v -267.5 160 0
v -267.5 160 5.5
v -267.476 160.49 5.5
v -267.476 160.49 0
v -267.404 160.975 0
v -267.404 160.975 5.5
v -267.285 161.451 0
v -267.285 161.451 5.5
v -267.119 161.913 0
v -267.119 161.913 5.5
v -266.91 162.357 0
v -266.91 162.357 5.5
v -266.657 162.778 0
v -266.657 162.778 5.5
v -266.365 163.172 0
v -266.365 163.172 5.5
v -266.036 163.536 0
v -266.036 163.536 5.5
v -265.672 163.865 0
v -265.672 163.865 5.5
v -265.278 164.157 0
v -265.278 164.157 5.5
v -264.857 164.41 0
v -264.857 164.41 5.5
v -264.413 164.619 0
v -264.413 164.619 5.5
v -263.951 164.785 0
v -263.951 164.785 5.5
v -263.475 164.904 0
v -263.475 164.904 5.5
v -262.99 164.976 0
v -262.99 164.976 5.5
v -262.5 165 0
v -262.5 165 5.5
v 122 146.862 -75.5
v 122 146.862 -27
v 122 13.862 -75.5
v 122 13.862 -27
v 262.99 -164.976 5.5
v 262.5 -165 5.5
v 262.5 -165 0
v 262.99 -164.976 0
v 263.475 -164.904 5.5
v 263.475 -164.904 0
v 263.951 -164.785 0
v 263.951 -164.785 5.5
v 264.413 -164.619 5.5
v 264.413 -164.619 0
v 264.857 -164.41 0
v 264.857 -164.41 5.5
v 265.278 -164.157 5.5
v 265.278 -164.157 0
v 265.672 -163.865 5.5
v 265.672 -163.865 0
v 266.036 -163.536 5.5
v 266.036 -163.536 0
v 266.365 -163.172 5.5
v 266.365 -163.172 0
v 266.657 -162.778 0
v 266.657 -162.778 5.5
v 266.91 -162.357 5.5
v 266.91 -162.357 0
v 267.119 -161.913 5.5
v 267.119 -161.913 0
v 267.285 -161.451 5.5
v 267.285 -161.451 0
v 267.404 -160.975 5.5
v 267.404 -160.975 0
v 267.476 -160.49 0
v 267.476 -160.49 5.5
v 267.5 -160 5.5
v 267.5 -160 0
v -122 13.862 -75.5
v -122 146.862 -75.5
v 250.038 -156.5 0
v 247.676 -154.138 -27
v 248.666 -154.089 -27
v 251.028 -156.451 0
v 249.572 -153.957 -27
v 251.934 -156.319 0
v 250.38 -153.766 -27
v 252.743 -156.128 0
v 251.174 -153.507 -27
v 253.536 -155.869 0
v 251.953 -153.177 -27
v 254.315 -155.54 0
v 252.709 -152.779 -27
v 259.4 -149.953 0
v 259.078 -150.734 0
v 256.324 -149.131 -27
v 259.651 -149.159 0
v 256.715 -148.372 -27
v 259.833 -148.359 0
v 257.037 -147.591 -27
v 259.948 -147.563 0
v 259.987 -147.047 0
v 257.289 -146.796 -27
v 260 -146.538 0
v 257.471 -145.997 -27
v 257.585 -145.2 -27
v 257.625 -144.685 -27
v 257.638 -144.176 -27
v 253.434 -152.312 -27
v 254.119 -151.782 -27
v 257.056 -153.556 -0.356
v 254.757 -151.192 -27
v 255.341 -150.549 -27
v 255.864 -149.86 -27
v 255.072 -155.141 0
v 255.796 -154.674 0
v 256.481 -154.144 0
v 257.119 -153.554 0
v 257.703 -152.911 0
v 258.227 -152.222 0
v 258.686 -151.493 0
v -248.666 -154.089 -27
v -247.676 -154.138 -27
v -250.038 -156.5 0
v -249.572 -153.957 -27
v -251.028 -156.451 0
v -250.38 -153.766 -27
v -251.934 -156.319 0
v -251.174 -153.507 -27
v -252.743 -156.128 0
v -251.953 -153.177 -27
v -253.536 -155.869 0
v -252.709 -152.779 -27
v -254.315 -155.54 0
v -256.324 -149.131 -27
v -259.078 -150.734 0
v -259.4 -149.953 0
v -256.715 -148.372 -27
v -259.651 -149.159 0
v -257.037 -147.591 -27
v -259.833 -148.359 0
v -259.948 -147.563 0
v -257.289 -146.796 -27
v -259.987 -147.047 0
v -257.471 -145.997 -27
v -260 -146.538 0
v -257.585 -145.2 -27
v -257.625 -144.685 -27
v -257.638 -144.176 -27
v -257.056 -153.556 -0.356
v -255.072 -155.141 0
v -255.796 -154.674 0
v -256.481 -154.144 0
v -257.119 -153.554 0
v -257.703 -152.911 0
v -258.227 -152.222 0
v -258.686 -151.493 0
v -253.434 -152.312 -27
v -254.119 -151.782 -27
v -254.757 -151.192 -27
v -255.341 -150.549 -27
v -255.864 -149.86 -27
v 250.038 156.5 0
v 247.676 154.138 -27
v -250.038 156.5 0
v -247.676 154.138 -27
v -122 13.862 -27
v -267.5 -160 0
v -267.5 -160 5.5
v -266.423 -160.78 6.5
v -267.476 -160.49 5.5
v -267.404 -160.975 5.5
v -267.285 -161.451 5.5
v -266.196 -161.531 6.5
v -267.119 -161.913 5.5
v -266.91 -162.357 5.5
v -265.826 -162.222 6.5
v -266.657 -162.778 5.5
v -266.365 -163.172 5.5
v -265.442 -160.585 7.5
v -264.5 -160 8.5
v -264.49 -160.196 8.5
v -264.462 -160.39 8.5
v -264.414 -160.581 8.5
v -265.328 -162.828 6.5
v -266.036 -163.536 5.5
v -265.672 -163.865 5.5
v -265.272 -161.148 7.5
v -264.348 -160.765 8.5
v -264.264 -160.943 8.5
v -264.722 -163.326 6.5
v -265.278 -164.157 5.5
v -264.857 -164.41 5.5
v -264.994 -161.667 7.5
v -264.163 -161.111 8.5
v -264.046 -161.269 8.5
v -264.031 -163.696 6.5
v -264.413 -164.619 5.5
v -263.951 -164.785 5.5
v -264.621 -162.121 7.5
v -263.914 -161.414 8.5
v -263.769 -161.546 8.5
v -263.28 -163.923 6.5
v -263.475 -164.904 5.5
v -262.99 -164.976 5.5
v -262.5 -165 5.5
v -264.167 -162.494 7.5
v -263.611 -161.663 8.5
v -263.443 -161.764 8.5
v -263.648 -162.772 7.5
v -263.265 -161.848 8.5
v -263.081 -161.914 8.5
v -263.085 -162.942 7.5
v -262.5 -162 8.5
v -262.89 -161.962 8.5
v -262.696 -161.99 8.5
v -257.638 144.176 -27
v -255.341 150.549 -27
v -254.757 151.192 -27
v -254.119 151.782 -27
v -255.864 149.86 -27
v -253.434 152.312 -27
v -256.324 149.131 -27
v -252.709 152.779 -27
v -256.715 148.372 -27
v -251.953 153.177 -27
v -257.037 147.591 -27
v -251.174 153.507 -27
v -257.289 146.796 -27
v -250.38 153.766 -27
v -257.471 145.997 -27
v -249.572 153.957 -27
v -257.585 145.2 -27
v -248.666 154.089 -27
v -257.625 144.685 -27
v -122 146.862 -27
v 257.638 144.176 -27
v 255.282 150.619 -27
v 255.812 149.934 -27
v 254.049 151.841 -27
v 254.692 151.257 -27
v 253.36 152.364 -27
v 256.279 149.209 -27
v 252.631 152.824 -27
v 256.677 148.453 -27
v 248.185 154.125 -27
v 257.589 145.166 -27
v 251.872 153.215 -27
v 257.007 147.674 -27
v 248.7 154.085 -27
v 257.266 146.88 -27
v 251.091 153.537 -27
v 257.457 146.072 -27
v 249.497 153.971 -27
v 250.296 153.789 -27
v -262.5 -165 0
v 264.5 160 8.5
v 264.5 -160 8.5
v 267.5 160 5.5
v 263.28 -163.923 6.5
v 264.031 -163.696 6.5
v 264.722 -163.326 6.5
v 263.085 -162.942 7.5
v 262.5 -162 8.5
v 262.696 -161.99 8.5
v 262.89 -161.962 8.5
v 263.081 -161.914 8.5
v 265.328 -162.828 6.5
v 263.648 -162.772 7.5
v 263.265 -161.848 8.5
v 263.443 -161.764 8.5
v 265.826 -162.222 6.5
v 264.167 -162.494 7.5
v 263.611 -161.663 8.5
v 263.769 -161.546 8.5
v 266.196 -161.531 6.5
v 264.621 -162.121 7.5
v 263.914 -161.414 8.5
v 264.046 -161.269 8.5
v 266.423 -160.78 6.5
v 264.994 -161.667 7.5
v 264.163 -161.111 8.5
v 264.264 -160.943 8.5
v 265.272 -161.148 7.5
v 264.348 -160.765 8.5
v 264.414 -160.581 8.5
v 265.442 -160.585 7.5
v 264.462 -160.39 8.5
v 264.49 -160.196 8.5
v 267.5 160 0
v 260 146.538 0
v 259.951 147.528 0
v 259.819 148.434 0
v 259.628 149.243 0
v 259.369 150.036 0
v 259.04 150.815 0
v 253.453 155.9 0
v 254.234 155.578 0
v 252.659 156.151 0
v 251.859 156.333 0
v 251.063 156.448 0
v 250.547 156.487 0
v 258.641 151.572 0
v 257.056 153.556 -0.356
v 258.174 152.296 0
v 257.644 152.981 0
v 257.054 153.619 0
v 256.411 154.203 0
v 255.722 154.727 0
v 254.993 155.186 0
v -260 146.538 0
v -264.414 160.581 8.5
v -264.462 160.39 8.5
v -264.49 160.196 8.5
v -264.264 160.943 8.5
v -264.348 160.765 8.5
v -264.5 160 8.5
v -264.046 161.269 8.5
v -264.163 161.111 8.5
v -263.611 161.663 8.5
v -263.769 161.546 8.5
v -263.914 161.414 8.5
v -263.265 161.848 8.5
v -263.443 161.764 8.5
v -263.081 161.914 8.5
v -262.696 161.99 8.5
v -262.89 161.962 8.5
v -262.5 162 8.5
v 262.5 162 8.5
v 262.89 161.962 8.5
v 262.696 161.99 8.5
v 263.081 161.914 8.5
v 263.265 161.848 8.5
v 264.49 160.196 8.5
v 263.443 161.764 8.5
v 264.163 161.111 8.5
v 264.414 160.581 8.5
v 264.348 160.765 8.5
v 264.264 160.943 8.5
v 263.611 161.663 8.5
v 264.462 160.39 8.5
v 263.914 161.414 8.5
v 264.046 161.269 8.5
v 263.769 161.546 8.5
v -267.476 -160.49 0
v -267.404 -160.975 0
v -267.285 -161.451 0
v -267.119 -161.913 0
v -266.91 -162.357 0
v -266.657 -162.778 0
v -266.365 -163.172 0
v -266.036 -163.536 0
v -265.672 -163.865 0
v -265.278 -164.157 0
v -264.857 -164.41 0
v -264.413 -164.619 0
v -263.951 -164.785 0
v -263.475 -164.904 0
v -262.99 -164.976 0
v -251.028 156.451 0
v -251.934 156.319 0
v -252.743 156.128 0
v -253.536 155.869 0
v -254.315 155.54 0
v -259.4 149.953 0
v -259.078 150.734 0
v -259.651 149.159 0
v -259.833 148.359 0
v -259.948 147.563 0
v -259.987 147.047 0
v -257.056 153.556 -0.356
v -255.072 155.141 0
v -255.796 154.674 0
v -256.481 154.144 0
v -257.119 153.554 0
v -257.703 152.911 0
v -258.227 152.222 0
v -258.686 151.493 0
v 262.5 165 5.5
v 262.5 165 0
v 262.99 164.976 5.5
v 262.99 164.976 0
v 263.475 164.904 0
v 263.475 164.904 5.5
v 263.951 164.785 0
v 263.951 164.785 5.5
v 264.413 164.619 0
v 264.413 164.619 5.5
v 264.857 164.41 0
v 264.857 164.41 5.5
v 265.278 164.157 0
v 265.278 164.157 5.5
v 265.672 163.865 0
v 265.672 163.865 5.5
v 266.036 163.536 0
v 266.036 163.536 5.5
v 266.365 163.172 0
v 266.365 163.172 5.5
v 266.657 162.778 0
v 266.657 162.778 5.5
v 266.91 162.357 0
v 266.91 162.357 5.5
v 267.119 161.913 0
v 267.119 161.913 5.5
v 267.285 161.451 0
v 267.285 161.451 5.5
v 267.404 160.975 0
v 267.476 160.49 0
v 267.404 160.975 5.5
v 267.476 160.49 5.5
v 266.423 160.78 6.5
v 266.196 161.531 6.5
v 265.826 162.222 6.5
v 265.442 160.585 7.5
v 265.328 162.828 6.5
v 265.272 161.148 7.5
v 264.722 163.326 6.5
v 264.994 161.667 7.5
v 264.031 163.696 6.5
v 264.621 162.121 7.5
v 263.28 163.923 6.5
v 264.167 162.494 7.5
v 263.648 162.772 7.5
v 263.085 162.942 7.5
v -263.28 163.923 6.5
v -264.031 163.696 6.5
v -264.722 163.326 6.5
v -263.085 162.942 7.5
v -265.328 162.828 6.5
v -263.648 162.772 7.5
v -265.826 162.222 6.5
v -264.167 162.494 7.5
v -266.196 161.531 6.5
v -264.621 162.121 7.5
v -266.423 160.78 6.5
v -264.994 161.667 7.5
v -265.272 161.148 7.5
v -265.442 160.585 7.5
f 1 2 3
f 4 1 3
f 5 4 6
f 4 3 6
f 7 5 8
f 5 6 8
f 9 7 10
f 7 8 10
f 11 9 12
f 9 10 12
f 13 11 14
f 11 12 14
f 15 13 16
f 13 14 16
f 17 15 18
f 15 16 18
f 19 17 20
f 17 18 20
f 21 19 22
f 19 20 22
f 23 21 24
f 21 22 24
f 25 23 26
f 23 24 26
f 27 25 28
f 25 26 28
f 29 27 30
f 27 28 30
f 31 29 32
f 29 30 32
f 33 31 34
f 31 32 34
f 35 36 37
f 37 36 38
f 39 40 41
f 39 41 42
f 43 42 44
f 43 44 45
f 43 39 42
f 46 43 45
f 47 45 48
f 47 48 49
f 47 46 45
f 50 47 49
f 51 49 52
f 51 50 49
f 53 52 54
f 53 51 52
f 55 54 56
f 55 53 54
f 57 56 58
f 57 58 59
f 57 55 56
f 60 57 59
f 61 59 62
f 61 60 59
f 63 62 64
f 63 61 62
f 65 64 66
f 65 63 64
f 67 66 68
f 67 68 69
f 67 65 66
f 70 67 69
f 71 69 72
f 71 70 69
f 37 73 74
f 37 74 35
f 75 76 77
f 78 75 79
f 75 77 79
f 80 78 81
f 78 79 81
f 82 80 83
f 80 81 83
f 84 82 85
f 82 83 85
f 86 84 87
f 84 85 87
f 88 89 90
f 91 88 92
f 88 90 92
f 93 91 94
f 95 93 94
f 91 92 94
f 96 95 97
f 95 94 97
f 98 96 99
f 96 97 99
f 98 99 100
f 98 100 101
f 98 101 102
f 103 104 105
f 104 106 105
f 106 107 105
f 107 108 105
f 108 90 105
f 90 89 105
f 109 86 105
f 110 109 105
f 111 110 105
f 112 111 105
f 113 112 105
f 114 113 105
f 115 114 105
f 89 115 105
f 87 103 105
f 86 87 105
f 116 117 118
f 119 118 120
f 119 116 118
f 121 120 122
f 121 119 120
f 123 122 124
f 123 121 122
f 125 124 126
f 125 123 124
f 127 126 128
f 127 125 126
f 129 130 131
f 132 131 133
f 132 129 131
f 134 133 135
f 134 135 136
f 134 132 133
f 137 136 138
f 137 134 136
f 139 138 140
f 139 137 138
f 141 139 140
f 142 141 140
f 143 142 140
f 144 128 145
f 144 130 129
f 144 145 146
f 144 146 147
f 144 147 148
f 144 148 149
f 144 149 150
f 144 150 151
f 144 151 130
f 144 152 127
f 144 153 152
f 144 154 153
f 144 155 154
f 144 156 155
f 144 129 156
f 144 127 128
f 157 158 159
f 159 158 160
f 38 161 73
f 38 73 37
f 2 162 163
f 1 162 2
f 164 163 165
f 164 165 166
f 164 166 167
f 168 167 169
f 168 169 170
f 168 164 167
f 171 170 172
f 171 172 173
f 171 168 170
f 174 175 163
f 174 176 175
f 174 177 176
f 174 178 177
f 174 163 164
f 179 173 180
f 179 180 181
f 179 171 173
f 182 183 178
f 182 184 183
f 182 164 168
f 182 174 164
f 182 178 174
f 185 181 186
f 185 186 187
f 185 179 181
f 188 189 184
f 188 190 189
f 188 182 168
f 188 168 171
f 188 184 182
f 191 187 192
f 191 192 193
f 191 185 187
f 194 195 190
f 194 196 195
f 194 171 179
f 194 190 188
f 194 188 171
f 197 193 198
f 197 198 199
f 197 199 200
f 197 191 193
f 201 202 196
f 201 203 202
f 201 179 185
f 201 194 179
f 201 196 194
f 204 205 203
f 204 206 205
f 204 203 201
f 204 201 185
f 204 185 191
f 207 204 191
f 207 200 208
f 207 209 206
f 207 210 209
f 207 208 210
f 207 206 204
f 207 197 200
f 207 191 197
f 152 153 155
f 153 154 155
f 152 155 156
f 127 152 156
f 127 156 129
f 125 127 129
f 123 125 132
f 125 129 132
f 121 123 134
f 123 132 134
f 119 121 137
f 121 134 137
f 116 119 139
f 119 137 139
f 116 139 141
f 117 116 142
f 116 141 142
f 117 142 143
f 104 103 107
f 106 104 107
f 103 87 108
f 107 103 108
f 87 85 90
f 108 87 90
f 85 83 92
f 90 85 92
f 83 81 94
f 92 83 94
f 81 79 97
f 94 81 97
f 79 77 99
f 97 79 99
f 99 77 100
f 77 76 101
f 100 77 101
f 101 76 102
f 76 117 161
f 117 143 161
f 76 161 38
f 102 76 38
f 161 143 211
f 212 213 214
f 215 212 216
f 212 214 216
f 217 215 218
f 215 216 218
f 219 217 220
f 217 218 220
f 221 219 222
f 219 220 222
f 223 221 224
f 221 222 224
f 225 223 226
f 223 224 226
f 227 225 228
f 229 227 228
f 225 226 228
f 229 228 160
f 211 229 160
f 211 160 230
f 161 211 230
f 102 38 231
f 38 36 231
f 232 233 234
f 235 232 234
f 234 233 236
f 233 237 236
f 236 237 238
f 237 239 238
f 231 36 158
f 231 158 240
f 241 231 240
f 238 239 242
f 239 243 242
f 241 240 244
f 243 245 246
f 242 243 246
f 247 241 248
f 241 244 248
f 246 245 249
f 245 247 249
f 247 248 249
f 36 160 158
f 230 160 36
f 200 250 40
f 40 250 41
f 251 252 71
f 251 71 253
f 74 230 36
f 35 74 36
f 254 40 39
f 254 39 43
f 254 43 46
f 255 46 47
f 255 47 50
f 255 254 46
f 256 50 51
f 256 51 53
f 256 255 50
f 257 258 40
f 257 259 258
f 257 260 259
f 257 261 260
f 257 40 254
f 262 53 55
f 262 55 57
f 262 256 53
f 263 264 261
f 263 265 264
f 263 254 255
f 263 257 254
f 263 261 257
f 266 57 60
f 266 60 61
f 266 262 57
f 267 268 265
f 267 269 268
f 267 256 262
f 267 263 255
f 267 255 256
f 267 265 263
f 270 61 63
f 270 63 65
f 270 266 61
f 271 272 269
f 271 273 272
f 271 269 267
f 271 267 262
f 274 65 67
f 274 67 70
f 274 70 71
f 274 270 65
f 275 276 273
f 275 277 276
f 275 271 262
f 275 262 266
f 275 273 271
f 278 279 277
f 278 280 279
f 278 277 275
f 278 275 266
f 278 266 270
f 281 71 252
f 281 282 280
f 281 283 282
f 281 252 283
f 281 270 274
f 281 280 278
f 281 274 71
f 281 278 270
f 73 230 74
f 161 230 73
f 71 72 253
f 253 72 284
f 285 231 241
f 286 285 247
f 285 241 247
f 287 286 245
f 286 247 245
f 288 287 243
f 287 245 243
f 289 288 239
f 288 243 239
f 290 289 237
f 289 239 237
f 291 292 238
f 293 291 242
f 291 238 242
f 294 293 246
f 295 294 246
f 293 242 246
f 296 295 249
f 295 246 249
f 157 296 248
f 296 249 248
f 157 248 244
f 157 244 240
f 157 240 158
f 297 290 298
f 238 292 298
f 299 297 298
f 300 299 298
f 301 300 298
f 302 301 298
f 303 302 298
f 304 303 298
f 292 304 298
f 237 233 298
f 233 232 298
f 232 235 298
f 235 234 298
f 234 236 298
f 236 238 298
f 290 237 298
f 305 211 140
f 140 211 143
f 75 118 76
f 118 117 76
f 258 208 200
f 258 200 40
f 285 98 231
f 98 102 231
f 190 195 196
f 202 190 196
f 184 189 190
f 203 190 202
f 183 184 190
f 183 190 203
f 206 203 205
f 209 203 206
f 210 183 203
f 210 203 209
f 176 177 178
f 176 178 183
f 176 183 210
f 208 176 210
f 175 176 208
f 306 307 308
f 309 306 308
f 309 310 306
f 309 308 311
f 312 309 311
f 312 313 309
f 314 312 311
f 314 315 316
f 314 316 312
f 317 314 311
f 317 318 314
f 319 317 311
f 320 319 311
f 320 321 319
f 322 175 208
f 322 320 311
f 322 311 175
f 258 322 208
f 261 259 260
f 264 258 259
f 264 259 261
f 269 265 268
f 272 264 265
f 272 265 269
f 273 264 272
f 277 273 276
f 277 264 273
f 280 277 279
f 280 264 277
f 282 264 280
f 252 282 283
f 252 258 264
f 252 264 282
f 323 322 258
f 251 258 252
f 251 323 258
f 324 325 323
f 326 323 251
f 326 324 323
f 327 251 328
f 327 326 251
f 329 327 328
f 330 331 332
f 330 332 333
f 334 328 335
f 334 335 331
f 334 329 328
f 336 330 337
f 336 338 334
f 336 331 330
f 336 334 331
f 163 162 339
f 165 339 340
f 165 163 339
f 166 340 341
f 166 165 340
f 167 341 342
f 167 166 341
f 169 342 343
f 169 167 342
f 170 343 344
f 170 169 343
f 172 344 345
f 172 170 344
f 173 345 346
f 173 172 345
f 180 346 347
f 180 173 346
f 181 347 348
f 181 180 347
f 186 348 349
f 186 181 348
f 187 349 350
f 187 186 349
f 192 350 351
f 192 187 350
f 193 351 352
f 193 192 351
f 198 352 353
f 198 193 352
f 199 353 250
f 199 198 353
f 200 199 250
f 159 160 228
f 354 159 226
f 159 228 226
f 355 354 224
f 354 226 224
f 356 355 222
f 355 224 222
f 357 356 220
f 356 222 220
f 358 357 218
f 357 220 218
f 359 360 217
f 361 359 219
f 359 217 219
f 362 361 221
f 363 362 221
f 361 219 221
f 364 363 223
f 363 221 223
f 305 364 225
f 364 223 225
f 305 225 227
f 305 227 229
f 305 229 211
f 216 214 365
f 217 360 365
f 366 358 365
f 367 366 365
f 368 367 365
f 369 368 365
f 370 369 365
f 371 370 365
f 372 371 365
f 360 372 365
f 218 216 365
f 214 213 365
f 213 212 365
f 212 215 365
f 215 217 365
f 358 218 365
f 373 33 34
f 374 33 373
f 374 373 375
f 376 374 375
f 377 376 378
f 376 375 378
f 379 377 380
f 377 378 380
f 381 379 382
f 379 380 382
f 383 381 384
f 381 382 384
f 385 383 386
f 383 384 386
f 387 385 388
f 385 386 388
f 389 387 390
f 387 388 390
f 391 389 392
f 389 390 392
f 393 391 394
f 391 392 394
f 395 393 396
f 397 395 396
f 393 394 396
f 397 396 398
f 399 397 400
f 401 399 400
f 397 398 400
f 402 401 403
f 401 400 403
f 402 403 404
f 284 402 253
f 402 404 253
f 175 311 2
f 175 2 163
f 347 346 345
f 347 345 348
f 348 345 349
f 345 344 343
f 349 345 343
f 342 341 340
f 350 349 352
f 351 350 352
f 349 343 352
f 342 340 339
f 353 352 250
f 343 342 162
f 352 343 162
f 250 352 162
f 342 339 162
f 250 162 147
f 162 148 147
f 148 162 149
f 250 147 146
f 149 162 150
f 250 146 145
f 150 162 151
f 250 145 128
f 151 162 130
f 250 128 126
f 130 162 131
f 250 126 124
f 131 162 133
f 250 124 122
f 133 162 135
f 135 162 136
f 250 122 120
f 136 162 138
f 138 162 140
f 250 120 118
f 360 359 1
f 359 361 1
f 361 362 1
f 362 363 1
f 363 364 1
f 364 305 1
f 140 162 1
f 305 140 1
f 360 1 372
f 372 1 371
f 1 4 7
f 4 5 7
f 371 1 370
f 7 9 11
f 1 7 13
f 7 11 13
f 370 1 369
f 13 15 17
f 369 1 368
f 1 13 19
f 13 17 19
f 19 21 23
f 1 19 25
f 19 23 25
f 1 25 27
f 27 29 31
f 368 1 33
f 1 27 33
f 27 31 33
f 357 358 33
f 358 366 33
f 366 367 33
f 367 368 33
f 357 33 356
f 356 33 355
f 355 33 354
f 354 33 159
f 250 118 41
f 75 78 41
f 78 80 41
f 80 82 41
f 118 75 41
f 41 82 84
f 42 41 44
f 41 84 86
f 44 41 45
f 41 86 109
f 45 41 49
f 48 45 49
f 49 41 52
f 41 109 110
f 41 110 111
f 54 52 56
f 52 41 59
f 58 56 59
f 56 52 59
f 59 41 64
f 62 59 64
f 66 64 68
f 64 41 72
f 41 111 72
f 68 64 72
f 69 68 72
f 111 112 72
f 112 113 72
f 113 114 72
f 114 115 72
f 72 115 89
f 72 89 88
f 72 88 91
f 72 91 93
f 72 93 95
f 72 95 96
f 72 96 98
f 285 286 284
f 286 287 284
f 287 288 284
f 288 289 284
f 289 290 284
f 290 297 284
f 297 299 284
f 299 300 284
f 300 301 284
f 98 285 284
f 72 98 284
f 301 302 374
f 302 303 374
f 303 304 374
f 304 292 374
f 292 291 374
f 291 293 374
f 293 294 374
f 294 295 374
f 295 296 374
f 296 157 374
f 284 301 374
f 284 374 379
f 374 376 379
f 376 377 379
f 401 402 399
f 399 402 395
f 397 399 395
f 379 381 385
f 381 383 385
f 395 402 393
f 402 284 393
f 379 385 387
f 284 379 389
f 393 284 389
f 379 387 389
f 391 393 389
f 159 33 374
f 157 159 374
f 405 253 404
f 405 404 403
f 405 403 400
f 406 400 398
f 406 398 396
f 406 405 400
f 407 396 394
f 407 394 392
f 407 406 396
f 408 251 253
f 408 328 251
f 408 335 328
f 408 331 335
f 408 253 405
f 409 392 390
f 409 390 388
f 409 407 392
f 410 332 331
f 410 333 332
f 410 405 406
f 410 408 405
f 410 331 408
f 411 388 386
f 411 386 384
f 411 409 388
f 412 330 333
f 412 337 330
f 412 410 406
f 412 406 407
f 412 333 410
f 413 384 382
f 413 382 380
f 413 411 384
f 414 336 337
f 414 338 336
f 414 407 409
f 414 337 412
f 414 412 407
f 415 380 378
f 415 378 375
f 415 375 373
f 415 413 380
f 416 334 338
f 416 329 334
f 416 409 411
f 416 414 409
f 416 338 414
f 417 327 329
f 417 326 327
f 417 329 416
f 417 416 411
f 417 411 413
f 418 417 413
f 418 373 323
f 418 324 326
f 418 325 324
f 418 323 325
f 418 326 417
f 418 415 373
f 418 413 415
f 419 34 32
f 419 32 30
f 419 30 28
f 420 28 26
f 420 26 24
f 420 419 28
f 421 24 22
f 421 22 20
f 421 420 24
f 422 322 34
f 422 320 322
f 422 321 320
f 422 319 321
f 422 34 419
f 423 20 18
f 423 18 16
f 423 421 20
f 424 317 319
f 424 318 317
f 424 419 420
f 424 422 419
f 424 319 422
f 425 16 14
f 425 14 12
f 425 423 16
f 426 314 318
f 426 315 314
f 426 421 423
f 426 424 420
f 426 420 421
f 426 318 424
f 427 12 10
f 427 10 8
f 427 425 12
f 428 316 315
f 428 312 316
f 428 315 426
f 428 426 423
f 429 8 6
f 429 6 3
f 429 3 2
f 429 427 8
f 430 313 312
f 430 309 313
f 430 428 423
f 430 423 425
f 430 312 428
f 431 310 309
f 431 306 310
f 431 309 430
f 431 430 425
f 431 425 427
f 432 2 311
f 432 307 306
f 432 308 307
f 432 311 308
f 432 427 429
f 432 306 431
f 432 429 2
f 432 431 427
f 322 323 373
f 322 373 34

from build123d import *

# Parameters (mm, degrees)
F0_W     = 535
F0_H     = 330
F0_W_2   = 520
F0_H_2   = 313
F1_DEPTH = 8.5
F2_DEPTH = 27
F2_TAPER = 5
F3_W     = 244
F3_H     = 133
F4_DEPTH = 48.5
F5_R     = 5
F6_R     = 10
F7_SIZE  = 3


with BuildPart() as f1:
    # F0 (on Top) → F1 (new body)
    with BuildSketch(Plane.XY):
        Rectangle(F0_W, F0_H)
        Rectangle(F0_W_2, F0_H_2, mode=Mode.SUBTRACT)
        Rectangle(F0_W_2, F0_H_2)
    extrude(amount=F1_DEPTH)

    # F0 (on Top) → F2 (join)
    with BuildSketch(Plane.XY):
        Rectangle(F0_W_2, F0_H_2)
    extrude(amount=-F2_DEPTH, taper=F2_TAPER)

    # F3 (on face) → F4 (join)
    with BuildSketch(Plane(origin=(0, 0, -27), x_dir=(1, 0, 0), z_dir=(0, 0, -1))):
        with Locations((0, -80.3621939152)):
            Rectangle(F3_W, F3_H)
    extrude(amount=F4_DEPTH)

    # F5
    f5_edges = [f1.edges().sort_by_distance(p)[0] for p in [
        (267.5, 165, 4.25),
        (-267.5, 165, 4.25),
        (-267.5, -165, 4.25),
        (267.5, -165, 4.25),
    ]]
    fillet(f5_edges, radius=F5_R)

    # F6
    f6_edges = [f1.edges().sort_by_distance(p)[0] for p in [
        (258.818903, -155.318903, -13.5),
        (258.818903, 155.318903, -13.5),
        (-258.818903, 155.318903, -13.5),
        (-258.818903, -155.318903, -13.5),
    ]]
    fillet(f6_edges, radius=F6_R)

    # F7
    f7_edges = [f1.edges().sort_by_distance(p)[0] for p in [
        (0, -165, 8.5),
    ]]
    chamfer(f7_edges, length=F7_SIZE)


solid = f1.part
